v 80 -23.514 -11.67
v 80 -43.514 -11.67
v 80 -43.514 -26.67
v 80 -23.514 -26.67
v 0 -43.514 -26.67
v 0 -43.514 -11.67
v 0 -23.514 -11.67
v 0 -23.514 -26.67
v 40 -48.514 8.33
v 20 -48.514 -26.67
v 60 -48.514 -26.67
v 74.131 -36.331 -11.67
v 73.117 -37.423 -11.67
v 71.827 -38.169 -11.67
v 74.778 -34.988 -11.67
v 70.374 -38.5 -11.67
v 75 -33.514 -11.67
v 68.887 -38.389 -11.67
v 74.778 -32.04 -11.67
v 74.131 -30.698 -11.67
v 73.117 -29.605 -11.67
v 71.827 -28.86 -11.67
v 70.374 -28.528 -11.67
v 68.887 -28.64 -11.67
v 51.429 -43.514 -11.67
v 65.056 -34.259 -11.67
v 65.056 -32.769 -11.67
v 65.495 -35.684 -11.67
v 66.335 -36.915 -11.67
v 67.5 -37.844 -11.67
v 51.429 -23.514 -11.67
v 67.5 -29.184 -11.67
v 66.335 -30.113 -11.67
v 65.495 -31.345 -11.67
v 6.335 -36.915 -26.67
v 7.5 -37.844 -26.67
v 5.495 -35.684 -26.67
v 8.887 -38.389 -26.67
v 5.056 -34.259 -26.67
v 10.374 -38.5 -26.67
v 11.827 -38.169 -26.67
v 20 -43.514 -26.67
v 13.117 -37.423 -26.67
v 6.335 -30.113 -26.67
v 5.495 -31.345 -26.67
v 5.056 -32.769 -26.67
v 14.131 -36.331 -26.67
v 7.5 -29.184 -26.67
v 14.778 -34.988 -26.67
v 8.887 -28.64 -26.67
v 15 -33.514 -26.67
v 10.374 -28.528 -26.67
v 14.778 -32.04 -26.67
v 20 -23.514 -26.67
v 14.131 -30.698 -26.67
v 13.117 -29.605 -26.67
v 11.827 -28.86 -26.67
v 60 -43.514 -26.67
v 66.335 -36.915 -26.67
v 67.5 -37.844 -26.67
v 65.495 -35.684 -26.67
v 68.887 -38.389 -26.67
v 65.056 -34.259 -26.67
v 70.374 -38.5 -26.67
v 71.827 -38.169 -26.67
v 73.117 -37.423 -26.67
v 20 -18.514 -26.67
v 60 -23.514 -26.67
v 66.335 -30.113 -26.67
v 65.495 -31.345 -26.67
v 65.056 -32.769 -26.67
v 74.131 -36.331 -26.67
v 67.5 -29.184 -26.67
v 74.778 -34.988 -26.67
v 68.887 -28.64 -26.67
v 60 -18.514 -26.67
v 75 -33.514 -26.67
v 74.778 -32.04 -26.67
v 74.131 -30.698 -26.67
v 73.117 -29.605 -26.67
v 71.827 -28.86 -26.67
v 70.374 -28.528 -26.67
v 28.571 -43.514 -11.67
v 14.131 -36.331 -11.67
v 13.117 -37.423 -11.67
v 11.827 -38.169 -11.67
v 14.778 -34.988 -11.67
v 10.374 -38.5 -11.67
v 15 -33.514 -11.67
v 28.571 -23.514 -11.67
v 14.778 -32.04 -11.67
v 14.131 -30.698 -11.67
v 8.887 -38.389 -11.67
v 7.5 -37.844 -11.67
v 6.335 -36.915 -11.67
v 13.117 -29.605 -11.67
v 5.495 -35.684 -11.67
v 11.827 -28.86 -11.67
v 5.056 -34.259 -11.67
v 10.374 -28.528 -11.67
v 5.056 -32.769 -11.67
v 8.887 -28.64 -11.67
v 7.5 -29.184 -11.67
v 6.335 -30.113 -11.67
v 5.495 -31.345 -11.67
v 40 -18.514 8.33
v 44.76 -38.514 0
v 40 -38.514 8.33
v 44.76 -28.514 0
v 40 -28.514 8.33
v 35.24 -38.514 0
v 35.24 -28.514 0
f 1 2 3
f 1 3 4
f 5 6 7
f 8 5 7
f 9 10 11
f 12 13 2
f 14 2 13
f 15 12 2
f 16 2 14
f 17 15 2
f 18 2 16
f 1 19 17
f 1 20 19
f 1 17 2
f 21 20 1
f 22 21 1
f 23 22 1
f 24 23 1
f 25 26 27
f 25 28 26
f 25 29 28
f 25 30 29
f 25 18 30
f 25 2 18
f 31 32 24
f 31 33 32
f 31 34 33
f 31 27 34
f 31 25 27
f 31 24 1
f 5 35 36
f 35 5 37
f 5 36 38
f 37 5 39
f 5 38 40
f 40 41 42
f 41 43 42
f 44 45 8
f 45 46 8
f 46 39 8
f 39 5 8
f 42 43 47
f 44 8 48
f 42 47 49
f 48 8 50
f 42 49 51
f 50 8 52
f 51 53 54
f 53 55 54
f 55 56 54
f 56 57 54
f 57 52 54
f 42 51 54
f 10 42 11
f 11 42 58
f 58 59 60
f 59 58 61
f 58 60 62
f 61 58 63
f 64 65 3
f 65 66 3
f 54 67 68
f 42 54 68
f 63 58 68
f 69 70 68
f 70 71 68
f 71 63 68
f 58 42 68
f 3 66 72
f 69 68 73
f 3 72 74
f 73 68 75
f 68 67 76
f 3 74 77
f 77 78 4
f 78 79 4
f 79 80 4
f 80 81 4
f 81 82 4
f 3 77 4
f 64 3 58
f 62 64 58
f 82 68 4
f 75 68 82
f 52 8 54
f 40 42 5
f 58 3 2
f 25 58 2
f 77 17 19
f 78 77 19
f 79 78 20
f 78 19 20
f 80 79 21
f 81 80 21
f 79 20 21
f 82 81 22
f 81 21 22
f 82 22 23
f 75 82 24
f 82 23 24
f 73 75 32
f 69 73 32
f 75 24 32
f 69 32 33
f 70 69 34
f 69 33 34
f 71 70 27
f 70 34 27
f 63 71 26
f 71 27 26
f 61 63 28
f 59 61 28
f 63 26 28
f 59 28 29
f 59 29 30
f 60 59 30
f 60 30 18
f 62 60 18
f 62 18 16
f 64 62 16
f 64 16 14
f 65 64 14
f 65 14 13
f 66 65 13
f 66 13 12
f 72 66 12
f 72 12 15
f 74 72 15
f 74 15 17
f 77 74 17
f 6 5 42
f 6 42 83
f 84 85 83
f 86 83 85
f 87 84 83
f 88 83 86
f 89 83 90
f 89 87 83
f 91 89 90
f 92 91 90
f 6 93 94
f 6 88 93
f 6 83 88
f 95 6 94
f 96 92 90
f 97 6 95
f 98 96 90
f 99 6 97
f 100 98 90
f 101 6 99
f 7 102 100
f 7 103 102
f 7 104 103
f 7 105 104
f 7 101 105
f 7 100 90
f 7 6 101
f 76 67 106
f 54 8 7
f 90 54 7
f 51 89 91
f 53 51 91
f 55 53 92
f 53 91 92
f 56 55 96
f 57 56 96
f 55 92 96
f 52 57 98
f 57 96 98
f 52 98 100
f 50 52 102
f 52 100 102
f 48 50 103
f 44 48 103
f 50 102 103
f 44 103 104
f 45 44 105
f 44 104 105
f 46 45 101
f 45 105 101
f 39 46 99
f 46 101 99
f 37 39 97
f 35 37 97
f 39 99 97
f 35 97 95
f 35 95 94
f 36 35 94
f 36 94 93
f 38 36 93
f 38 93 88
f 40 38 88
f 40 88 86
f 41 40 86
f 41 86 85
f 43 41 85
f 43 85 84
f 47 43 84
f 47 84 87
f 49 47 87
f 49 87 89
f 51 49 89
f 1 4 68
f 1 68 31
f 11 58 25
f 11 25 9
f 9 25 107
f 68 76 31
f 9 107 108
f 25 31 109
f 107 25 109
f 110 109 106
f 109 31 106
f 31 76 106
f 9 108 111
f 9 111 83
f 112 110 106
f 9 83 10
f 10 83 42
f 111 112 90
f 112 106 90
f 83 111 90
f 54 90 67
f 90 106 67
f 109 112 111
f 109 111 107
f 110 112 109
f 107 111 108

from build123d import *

# Parameters (mm, degrees)
F0_W          = 20
F0_H          = 15
F1_DEPTH      = 80
F3_DEPTH      = 25
F3_DEPTH_BACK = 5
F4_W          = 12.7
F4_H          = 10
F5_DEPTH      = 8.382
F6_R          = 5
F7_DEPTH      = 25.4


with BuildPart() as f1:
    # F0 (on Right) → F1 (new body)
    with BuildSketch(Plane.YZ):
        with Locations((-33.5142107308, -19.1700014472)):
            Rectangle(F0_W, F0_H)
    extrude(amount=F1_DEPTH)

    # F2 (on face) → F3 (join, two sides)
    with BuildSketch(Plane.XZ.offset(43.5142107308)) as f3_sk:
        Polygon((20, -26.6700014472), (40, -26.6700014472), (40, 8.3299985528), align=None)
        Polygon((40, 8.3299985528), (40, -26.6700014472), (60, -26.6700014472), align=None)
    extrude(amount=-F3_DEPTH)
    extrude(f3_sk.sketch, amount=F3_DEPTH_BACK)

    # F4 (on Top) → F5 (cut)
    with BuildSketch(Plane.XY):
        with Locations((40, -33.5142107308)):
            Rectangle(F4_W, F4_H)
    extrude(amount=F5_DEPTH, mode=Mode.SUBTRACT)

    # F6 (on face) → F7 (cut)
    with BuildSketch(Plane.XY.offset(-11.6700014472)):
        with Locations((10, -33.5142107308)):
            Circle(F6_R)
        with Locations((70, -33.5142107308)):
            Circle(F6_R)
    extrude(amount=-F7_DEPTH, mode=Mode.SUBTRACT)


solid = f1.part
